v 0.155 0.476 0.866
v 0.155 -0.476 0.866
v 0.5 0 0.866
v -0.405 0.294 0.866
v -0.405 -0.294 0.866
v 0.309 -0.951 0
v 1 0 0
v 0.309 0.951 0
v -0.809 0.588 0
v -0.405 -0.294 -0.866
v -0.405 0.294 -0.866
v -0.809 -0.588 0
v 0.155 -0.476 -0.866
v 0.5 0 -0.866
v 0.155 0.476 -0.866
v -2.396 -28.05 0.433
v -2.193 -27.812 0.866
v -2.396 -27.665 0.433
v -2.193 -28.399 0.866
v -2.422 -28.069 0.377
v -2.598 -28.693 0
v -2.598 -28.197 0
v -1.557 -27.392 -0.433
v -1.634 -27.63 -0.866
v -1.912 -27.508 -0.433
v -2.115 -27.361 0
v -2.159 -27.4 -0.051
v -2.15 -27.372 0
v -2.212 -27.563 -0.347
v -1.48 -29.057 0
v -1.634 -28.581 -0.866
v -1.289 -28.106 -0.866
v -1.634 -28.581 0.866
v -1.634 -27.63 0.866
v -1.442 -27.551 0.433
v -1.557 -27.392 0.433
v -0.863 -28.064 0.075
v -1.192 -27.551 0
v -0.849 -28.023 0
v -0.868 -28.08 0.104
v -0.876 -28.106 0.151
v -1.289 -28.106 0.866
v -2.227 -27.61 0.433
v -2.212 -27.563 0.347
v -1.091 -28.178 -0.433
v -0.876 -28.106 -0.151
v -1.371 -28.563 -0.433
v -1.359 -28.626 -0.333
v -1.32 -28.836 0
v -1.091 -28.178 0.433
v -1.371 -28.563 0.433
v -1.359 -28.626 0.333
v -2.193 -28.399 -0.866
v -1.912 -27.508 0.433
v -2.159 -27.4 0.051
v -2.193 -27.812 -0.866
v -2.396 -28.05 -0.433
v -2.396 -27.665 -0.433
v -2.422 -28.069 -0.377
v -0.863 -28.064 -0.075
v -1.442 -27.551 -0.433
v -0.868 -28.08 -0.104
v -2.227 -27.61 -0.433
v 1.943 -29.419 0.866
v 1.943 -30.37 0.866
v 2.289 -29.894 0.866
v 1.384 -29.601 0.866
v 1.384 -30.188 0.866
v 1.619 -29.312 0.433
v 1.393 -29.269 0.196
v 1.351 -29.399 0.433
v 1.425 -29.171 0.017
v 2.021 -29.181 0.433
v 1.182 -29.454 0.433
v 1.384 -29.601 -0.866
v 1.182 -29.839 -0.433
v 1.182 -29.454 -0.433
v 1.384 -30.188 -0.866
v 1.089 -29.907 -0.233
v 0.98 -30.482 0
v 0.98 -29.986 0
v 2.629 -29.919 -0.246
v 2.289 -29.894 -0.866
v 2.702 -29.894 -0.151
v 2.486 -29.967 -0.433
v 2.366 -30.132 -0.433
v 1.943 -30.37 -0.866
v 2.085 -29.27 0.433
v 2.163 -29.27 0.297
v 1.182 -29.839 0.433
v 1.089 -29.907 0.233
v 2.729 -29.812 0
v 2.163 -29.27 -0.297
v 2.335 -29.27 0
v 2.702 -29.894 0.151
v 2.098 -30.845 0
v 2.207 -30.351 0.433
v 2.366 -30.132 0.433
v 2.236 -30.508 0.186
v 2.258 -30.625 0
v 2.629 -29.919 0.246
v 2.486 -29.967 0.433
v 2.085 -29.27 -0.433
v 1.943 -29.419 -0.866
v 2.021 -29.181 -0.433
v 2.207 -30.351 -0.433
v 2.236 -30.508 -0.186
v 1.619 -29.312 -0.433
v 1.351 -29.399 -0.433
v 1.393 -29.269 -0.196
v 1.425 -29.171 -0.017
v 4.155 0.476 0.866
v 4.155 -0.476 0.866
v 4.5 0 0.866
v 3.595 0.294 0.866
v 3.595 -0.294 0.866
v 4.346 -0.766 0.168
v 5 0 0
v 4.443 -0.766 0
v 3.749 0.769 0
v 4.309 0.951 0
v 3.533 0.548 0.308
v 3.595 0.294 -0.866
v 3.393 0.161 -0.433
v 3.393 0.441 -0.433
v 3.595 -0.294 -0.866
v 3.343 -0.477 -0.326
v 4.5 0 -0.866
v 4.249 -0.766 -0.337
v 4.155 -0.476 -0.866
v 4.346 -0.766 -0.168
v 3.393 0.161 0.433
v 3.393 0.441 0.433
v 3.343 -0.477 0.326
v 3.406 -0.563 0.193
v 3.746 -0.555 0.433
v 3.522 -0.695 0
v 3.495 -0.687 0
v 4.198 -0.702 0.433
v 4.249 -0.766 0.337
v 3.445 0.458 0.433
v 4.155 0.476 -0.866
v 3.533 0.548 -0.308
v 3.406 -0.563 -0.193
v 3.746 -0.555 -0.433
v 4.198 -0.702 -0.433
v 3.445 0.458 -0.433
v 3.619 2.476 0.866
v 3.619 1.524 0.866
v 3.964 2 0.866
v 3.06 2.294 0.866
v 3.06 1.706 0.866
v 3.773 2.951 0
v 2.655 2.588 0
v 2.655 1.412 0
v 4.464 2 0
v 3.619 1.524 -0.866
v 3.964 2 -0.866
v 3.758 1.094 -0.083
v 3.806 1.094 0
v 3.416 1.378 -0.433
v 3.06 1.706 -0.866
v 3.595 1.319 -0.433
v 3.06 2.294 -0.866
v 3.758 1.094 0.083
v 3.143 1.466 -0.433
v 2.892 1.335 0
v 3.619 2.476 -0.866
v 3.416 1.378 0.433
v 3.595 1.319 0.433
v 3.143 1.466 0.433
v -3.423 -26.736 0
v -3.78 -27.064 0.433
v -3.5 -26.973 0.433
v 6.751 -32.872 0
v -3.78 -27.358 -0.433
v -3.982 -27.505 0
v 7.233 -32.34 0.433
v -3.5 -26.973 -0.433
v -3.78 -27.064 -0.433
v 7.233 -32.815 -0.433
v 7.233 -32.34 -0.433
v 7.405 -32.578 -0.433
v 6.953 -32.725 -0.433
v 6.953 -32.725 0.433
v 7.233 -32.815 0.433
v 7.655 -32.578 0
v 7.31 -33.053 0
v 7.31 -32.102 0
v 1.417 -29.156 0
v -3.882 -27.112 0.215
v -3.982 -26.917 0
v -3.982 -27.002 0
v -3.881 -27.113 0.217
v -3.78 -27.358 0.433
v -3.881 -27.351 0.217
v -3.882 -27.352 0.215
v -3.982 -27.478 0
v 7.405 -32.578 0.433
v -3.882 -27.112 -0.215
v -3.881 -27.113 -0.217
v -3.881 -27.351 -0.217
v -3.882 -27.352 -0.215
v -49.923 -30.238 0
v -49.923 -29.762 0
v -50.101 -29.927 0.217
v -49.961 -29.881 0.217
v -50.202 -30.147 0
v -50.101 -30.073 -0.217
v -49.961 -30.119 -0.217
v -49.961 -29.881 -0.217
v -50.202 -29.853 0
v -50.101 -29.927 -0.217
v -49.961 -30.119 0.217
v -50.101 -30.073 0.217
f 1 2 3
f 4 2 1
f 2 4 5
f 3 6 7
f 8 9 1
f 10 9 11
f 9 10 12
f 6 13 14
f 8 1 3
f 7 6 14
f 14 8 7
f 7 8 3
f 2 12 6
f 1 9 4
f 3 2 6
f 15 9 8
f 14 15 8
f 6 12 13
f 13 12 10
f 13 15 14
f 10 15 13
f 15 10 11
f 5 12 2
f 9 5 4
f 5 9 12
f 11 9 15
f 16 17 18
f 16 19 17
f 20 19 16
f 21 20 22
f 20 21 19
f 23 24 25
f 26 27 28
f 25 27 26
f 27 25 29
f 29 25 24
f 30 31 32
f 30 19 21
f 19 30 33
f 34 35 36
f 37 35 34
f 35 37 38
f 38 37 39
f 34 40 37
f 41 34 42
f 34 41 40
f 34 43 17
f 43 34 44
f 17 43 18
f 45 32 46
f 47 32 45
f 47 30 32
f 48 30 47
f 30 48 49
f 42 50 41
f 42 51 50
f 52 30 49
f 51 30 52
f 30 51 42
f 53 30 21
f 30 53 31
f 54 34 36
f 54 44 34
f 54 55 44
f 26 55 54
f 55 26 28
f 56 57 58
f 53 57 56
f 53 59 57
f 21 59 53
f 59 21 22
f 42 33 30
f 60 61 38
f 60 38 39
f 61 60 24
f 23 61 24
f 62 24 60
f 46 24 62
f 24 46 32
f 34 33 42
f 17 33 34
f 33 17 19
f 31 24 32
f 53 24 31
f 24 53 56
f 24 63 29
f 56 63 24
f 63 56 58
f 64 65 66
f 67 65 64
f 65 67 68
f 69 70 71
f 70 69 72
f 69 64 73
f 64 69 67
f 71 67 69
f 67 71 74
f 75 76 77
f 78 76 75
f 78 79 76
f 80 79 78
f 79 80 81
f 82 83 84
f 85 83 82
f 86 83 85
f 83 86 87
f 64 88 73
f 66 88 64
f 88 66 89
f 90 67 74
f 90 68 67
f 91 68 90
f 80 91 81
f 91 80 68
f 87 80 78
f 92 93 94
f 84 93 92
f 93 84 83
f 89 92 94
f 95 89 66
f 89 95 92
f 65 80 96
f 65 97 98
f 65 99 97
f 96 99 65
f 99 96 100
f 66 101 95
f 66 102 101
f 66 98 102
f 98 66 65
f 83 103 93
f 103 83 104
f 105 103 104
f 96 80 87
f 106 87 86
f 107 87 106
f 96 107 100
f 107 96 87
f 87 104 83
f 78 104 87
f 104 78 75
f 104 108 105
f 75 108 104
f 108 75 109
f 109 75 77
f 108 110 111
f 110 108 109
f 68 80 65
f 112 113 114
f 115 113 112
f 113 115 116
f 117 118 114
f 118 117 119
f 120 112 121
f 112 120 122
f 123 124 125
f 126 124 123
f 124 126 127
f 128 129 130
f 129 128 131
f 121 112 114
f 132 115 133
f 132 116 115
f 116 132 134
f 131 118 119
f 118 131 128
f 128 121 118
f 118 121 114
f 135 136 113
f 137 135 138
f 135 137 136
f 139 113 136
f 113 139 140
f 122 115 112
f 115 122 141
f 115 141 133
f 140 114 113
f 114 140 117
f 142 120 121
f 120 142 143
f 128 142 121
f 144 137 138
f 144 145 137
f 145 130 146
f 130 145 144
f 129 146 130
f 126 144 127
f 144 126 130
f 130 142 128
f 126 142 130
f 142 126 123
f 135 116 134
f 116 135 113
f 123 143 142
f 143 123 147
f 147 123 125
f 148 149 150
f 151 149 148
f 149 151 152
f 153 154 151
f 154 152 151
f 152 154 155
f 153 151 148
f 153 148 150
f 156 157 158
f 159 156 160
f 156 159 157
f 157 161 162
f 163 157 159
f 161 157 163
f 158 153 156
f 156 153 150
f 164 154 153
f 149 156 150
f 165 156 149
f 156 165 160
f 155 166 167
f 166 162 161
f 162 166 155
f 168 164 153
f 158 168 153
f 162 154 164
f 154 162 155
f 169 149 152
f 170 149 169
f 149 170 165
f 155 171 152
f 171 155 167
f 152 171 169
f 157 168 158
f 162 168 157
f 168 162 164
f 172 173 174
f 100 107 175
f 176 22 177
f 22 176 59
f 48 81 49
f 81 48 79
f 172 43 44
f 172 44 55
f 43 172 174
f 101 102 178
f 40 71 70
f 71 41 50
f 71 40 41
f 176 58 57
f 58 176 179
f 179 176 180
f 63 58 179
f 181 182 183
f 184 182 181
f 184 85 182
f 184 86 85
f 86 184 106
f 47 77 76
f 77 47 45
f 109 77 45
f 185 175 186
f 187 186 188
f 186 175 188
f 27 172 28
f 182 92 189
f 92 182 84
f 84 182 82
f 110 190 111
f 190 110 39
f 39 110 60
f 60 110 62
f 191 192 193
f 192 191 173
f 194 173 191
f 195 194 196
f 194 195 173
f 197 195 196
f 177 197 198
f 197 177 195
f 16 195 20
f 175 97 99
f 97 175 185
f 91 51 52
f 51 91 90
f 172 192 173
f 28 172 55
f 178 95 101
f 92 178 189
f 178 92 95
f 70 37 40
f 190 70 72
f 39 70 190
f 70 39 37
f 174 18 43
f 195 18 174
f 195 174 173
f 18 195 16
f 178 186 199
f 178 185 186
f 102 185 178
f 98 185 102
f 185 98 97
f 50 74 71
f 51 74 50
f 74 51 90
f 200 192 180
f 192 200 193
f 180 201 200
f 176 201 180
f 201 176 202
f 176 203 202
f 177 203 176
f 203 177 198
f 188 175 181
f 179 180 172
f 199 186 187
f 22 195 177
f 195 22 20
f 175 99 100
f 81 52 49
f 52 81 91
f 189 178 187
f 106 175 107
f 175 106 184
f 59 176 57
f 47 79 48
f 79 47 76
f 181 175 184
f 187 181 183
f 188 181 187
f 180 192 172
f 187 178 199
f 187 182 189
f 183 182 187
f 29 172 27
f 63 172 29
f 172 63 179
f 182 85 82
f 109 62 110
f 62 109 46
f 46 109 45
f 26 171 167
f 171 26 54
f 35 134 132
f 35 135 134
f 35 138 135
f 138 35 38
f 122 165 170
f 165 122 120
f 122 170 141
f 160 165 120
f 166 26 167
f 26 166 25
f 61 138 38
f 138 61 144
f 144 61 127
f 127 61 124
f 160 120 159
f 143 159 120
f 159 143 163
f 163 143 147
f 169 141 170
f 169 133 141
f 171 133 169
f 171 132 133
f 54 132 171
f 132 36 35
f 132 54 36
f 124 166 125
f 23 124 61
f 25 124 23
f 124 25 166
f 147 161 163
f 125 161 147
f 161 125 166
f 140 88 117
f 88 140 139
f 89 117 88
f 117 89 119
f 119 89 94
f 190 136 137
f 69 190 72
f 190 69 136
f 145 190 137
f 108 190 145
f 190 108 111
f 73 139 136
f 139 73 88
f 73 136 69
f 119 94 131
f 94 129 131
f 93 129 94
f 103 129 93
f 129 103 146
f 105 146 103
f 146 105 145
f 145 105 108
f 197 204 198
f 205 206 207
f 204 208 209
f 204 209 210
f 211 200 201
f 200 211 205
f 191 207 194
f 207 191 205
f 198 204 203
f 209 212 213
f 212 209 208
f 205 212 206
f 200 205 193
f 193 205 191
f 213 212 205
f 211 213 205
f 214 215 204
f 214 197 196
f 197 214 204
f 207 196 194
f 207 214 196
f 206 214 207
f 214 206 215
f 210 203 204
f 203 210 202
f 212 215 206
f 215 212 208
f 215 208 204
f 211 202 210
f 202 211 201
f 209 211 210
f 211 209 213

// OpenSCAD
sphere(1);
    ahead=30;
    r=4;
    a=[cos($t*360   )*r,sin($t*360)   *r,0];
    b=[cos($t*360+ahead)*r,sin($t*360+ahead)*r,0];
    c=[2,a.y-30,0];
    d=[-2,b.y-30,0];
    e=lerp(c,d,.5) +un(d-c)*2;
    f=lerp(c,d,.5) -un(d-c)*2;
    
    
  color("red")    translate(e){sphere(1);}
   color("red")   translate(f){sphere(1);}
    
  color("red")     translate(a){sphere(1);}
  color("red")    translate(b){sphere(1);}
    color("red")    sphere(1);
  
  color("gray")    translate([0,0,-1]) circle(r);

    
  color("yellow")    hull() {
    translate(lerp(f,e,-1.5))sphere(.5);
   translate(lerp(f,e,1.5)) sphere(.5);

    }
   color("blue")   hull() {
    translate(b){sphere(.5);}
   translate(e) sphere(.5);

    }
     color("blue") hull() {
    translate(a){sphere(.5);}
    translate(f)sphere(.5);

    }
    
      color("gray")  hull() {
    translate(lerp(f,e,1.5))sphere(.25);
   translate([-50,-30,0]) sphere(.25);

    }
    function lerp(start, end, bias) = (end * bias + start * (1 - bias));
function un(v) = assert(is_list(v)) v / max(norm(v), 1e-64);
